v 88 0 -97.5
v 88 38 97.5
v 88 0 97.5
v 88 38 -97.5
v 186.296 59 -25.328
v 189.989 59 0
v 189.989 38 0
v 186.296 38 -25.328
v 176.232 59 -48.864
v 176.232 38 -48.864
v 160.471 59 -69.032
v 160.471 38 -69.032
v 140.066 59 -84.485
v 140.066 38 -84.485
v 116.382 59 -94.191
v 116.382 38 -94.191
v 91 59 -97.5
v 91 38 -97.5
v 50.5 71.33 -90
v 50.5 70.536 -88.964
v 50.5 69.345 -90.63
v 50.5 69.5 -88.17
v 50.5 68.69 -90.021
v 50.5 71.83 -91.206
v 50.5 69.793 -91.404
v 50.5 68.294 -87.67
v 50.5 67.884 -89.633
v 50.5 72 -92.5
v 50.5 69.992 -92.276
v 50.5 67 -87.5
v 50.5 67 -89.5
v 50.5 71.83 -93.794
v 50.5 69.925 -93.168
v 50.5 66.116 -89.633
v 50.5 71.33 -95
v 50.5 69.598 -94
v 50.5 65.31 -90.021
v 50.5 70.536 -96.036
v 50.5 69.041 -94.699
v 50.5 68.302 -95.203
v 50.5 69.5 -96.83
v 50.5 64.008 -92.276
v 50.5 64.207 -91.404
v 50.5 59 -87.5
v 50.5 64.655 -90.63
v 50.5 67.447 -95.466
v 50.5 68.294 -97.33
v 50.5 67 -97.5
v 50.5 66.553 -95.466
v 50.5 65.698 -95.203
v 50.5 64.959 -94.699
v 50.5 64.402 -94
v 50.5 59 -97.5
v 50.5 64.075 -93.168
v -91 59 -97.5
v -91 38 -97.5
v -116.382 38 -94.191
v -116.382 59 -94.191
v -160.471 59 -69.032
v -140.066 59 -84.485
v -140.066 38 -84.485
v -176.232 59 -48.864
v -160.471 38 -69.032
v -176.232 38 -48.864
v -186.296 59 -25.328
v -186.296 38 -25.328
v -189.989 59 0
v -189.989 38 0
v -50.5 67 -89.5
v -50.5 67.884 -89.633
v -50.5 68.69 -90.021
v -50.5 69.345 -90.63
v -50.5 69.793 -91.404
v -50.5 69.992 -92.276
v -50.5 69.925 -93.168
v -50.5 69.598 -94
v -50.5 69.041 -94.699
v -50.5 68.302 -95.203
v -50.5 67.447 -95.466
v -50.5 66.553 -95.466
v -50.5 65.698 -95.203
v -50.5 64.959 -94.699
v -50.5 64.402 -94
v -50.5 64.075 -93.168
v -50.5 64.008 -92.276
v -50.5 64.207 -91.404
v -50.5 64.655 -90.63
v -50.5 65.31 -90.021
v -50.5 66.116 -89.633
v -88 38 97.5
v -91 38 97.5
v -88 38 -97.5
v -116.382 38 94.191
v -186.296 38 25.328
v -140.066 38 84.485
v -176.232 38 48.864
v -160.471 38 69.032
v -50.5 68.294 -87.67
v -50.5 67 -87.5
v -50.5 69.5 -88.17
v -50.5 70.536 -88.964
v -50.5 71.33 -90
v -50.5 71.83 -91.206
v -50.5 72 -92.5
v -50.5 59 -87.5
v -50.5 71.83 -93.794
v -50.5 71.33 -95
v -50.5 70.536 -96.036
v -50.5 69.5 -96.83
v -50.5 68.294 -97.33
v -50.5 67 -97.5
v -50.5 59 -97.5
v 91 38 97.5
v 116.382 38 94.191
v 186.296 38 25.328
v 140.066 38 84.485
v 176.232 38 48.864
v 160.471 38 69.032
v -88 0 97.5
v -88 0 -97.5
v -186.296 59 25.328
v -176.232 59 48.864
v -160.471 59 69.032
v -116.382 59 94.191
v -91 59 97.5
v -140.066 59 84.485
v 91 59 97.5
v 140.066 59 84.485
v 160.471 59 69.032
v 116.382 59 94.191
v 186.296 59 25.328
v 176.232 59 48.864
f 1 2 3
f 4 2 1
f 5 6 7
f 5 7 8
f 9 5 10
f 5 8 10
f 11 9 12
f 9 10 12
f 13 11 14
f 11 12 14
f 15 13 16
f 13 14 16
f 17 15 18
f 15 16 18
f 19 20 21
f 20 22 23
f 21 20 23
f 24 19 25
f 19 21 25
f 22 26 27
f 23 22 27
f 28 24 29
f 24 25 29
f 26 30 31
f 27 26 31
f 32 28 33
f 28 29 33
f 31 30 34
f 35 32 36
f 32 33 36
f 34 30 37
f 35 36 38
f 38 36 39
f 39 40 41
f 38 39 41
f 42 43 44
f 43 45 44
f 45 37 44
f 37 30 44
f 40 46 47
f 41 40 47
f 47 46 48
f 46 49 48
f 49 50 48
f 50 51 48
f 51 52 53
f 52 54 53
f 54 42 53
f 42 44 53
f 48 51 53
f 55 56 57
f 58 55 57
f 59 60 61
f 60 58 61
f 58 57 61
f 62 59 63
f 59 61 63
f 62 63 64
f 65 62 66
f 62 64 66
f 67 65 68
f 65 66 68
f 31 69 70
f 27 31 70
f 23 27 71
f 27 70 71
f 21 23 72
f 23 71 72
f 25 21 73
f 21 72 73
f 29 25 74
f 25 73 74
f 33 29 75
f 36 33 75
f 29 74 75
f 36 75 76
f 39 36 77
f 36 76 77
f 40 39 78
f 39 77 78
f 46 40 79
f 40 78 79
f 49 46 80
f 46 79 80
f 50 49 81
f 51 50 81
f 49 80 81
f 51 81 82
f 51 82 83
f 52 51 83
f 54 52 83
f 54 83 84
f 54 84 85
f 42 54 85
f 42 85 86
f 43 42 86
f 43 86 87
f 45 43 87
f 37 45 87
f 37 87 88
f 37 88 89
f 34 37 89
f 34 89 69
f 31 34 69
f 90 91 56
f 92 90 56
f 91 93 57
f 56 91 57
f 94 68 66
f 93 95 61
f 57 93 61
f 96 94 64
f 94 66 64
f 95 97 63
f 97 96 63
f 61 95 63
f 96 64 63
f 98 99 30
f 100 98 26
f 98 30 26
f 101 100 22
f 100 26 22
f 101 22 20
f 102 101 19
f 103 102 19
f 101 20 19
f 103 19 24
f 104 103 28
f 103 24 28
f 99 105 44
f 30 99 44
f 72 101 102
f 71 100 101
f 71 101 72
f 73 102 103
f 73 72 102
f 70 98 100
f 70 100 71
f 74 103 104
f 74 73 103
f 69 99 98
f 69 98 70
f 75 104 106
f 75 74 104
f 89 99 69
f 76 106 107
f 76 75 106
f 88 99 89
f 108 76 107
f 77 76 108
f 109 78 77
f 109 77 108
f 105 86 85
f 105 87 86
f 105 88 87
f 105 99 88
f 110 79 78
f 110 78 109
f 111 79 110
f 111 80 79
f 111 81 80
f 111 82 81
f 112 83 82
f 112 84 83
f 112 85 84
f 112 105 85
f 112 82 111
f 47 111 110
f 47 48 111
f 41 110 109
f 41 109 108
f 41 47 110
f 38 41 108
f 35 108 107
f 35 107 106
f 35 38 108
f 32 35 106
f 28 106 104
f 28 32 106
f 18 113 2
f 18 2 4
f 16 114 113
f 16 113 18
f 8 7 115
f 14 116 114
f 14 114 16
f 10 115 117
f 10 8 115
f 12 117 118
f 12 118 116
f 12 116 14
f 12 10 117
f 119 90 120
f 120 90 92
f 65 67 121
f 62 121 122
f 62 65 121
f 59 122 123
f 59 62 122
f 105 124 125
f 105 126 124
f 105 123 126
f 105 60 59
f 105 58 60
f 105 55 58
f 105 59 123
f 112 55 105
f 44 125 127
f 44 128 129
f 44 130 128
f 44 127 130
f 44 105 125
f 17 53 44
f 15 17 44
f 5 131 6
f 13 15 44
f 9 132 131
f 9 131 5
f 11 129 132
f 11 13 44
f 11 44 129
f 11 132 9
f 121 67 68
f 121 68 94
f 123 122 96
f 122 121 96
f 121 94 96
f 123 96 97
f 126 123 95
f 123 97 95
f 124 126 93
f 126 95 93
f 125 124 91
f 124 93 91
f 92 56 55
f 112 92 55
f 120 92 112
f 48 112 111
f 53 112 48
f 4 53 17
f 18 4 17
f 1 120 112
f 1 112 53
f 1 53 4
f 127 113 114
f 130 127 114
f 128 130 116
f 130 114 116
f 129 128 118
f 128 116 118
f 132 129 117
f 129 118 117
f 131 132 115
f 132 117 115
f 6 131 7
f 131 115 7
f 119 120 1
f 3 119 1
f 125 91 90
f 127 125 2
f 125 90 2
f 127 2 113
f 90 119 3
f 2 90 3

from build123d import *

# Parameters (mm, degrees)
SKETCH1_W           = 380
SKETCH1_H           = 195
BOSS_EXTRUDE1_DEPTH = 59
SKETCH2_W           = 195
SKETCH2_H           = 38
CUT_EXTRUDE1_DEPTH  = 102
FILLET1_R           = 99
SKETCH3_W           = 101
SKETCH3_H           = 10
BOSS_EXTRUDE2_DEPTH = 13
FILLET2_R           = 5
SKETCH4_R           = 3
CUT_EXTRUDE2_DEPTH  = 112


# Some blends are built 0.0001 mm under size
with BuildPart() as part:
    # Sketch1 → Boss-Extrude1 (new body)
    with BuildSketch(Plane(origin=(0, 0, 0), x_dir=(1, 0, 0), z_dir=(0, 1, 0))):
        Rectangle(SKETCH1_W, SKETCH1_H)
    extrude(amount=BOSS_EXTRUDE1_DEPTH)

    # Sketch2 → Cut-Extrude1 (cut)
    with BuildSketch(Plane(origin=(190, 0, 0), x_dir=(0, 0, -1), z_dir=(1, 0, 0))):
        with Locations((0, 19)):
            Rectangle(SKETCH2_W, SKETCH2_H)
    cut_extrude1 = extrude(amount=-CUT_EXTRUDE1_DEPTH, mode=Mode.SUBTRACT)

    # Mirror1: Cut-Extrude1 across plane
    add(cut_extrude1.mirror(Plane(origin=(0, 0, 0), x_dir=(0, 0, 1), z_dir=(1, 0, 0))), mode=Mode.SUBTRACT)

    # Fillet1
    # the kernel refuses this fillet: 99 mm, written as the material it takes off along each edge
    with BuildSketch(Plane(origin=(-190, -209.5, 97.5), x_dir=(0, 0, -1), z_dir=(0, 1, 0)), Plane(origin=(-190, -209.5, -97.5), x_dir=(1, 0, 0), z_dir=(0, 1, 0))) as fillet1_piece_1:
        with BuildLine():
            CenterArc((FILLET1_R, -FILLET1_R), FILLET1_R, 90, 90)
            Line((0, -FILLET1_R), (0, 0))
            Line((0, 0), (FILLET1_R, 0))
        make_face()
    extrude(amount=516, mode=Mode.SUBTRACT)
    with BuildSketch(Plane(origin=(190, -209.5, -97.5), x_dir=(-1, 0, 0), z_dir=(0, 1, 0)), Plane(origin=(190, -209.5, 97.5), x_dir=(0, 0, -1), z_dir=(0, 1, 0))) as fillet1_piece_2:
        with BuildLine():
            CenterArc((FILLET1_R, FILLET1_R), FILLET1_R, 180, 90)
            Line((0, FILLET1_R), (0, 0))
            Line((0, 0), (FILLET1_R, 0))
        make_face()
    extrude(amount=516, mode=Mode.SUBTRACT)

    # Sketch3 → Boss-Extrude2 (add)
    with BuildSketch(Plane(origin=(0, 59, 0), x_dir=(1, 0, 0), z_dir=(0, 1, 0))):
        with Locations((0, 92.5)):
            Rectangle(SKETCH3_W, SKETCH3_H)
    extrude(amount=BOSS_EXTRUDE2_DEPTH)

    # Fillet2
    fillet2_edges = [part.edges().sort_by_distance(p)[0] for p in [
        (0, 72, -97.5),
        (0, 72, -87.5),
    ]]
    fillet(fillet2_edges, radius=FILLET2_R - 0.0001)  # a hair under: the kernel refuses the full size

    # Sketch4 → Cut-Extrude2 (cut)
    with BuildSketch(Plane.ZY.offset(50.5)):
        with Locations((-92.5, 67)):
            Circle(SKETCH4_R)
    extrude(amount=-CUT_EXTRUDE2_DEPTH, mode=Mode.SUBTRACT)


solid = part.part
